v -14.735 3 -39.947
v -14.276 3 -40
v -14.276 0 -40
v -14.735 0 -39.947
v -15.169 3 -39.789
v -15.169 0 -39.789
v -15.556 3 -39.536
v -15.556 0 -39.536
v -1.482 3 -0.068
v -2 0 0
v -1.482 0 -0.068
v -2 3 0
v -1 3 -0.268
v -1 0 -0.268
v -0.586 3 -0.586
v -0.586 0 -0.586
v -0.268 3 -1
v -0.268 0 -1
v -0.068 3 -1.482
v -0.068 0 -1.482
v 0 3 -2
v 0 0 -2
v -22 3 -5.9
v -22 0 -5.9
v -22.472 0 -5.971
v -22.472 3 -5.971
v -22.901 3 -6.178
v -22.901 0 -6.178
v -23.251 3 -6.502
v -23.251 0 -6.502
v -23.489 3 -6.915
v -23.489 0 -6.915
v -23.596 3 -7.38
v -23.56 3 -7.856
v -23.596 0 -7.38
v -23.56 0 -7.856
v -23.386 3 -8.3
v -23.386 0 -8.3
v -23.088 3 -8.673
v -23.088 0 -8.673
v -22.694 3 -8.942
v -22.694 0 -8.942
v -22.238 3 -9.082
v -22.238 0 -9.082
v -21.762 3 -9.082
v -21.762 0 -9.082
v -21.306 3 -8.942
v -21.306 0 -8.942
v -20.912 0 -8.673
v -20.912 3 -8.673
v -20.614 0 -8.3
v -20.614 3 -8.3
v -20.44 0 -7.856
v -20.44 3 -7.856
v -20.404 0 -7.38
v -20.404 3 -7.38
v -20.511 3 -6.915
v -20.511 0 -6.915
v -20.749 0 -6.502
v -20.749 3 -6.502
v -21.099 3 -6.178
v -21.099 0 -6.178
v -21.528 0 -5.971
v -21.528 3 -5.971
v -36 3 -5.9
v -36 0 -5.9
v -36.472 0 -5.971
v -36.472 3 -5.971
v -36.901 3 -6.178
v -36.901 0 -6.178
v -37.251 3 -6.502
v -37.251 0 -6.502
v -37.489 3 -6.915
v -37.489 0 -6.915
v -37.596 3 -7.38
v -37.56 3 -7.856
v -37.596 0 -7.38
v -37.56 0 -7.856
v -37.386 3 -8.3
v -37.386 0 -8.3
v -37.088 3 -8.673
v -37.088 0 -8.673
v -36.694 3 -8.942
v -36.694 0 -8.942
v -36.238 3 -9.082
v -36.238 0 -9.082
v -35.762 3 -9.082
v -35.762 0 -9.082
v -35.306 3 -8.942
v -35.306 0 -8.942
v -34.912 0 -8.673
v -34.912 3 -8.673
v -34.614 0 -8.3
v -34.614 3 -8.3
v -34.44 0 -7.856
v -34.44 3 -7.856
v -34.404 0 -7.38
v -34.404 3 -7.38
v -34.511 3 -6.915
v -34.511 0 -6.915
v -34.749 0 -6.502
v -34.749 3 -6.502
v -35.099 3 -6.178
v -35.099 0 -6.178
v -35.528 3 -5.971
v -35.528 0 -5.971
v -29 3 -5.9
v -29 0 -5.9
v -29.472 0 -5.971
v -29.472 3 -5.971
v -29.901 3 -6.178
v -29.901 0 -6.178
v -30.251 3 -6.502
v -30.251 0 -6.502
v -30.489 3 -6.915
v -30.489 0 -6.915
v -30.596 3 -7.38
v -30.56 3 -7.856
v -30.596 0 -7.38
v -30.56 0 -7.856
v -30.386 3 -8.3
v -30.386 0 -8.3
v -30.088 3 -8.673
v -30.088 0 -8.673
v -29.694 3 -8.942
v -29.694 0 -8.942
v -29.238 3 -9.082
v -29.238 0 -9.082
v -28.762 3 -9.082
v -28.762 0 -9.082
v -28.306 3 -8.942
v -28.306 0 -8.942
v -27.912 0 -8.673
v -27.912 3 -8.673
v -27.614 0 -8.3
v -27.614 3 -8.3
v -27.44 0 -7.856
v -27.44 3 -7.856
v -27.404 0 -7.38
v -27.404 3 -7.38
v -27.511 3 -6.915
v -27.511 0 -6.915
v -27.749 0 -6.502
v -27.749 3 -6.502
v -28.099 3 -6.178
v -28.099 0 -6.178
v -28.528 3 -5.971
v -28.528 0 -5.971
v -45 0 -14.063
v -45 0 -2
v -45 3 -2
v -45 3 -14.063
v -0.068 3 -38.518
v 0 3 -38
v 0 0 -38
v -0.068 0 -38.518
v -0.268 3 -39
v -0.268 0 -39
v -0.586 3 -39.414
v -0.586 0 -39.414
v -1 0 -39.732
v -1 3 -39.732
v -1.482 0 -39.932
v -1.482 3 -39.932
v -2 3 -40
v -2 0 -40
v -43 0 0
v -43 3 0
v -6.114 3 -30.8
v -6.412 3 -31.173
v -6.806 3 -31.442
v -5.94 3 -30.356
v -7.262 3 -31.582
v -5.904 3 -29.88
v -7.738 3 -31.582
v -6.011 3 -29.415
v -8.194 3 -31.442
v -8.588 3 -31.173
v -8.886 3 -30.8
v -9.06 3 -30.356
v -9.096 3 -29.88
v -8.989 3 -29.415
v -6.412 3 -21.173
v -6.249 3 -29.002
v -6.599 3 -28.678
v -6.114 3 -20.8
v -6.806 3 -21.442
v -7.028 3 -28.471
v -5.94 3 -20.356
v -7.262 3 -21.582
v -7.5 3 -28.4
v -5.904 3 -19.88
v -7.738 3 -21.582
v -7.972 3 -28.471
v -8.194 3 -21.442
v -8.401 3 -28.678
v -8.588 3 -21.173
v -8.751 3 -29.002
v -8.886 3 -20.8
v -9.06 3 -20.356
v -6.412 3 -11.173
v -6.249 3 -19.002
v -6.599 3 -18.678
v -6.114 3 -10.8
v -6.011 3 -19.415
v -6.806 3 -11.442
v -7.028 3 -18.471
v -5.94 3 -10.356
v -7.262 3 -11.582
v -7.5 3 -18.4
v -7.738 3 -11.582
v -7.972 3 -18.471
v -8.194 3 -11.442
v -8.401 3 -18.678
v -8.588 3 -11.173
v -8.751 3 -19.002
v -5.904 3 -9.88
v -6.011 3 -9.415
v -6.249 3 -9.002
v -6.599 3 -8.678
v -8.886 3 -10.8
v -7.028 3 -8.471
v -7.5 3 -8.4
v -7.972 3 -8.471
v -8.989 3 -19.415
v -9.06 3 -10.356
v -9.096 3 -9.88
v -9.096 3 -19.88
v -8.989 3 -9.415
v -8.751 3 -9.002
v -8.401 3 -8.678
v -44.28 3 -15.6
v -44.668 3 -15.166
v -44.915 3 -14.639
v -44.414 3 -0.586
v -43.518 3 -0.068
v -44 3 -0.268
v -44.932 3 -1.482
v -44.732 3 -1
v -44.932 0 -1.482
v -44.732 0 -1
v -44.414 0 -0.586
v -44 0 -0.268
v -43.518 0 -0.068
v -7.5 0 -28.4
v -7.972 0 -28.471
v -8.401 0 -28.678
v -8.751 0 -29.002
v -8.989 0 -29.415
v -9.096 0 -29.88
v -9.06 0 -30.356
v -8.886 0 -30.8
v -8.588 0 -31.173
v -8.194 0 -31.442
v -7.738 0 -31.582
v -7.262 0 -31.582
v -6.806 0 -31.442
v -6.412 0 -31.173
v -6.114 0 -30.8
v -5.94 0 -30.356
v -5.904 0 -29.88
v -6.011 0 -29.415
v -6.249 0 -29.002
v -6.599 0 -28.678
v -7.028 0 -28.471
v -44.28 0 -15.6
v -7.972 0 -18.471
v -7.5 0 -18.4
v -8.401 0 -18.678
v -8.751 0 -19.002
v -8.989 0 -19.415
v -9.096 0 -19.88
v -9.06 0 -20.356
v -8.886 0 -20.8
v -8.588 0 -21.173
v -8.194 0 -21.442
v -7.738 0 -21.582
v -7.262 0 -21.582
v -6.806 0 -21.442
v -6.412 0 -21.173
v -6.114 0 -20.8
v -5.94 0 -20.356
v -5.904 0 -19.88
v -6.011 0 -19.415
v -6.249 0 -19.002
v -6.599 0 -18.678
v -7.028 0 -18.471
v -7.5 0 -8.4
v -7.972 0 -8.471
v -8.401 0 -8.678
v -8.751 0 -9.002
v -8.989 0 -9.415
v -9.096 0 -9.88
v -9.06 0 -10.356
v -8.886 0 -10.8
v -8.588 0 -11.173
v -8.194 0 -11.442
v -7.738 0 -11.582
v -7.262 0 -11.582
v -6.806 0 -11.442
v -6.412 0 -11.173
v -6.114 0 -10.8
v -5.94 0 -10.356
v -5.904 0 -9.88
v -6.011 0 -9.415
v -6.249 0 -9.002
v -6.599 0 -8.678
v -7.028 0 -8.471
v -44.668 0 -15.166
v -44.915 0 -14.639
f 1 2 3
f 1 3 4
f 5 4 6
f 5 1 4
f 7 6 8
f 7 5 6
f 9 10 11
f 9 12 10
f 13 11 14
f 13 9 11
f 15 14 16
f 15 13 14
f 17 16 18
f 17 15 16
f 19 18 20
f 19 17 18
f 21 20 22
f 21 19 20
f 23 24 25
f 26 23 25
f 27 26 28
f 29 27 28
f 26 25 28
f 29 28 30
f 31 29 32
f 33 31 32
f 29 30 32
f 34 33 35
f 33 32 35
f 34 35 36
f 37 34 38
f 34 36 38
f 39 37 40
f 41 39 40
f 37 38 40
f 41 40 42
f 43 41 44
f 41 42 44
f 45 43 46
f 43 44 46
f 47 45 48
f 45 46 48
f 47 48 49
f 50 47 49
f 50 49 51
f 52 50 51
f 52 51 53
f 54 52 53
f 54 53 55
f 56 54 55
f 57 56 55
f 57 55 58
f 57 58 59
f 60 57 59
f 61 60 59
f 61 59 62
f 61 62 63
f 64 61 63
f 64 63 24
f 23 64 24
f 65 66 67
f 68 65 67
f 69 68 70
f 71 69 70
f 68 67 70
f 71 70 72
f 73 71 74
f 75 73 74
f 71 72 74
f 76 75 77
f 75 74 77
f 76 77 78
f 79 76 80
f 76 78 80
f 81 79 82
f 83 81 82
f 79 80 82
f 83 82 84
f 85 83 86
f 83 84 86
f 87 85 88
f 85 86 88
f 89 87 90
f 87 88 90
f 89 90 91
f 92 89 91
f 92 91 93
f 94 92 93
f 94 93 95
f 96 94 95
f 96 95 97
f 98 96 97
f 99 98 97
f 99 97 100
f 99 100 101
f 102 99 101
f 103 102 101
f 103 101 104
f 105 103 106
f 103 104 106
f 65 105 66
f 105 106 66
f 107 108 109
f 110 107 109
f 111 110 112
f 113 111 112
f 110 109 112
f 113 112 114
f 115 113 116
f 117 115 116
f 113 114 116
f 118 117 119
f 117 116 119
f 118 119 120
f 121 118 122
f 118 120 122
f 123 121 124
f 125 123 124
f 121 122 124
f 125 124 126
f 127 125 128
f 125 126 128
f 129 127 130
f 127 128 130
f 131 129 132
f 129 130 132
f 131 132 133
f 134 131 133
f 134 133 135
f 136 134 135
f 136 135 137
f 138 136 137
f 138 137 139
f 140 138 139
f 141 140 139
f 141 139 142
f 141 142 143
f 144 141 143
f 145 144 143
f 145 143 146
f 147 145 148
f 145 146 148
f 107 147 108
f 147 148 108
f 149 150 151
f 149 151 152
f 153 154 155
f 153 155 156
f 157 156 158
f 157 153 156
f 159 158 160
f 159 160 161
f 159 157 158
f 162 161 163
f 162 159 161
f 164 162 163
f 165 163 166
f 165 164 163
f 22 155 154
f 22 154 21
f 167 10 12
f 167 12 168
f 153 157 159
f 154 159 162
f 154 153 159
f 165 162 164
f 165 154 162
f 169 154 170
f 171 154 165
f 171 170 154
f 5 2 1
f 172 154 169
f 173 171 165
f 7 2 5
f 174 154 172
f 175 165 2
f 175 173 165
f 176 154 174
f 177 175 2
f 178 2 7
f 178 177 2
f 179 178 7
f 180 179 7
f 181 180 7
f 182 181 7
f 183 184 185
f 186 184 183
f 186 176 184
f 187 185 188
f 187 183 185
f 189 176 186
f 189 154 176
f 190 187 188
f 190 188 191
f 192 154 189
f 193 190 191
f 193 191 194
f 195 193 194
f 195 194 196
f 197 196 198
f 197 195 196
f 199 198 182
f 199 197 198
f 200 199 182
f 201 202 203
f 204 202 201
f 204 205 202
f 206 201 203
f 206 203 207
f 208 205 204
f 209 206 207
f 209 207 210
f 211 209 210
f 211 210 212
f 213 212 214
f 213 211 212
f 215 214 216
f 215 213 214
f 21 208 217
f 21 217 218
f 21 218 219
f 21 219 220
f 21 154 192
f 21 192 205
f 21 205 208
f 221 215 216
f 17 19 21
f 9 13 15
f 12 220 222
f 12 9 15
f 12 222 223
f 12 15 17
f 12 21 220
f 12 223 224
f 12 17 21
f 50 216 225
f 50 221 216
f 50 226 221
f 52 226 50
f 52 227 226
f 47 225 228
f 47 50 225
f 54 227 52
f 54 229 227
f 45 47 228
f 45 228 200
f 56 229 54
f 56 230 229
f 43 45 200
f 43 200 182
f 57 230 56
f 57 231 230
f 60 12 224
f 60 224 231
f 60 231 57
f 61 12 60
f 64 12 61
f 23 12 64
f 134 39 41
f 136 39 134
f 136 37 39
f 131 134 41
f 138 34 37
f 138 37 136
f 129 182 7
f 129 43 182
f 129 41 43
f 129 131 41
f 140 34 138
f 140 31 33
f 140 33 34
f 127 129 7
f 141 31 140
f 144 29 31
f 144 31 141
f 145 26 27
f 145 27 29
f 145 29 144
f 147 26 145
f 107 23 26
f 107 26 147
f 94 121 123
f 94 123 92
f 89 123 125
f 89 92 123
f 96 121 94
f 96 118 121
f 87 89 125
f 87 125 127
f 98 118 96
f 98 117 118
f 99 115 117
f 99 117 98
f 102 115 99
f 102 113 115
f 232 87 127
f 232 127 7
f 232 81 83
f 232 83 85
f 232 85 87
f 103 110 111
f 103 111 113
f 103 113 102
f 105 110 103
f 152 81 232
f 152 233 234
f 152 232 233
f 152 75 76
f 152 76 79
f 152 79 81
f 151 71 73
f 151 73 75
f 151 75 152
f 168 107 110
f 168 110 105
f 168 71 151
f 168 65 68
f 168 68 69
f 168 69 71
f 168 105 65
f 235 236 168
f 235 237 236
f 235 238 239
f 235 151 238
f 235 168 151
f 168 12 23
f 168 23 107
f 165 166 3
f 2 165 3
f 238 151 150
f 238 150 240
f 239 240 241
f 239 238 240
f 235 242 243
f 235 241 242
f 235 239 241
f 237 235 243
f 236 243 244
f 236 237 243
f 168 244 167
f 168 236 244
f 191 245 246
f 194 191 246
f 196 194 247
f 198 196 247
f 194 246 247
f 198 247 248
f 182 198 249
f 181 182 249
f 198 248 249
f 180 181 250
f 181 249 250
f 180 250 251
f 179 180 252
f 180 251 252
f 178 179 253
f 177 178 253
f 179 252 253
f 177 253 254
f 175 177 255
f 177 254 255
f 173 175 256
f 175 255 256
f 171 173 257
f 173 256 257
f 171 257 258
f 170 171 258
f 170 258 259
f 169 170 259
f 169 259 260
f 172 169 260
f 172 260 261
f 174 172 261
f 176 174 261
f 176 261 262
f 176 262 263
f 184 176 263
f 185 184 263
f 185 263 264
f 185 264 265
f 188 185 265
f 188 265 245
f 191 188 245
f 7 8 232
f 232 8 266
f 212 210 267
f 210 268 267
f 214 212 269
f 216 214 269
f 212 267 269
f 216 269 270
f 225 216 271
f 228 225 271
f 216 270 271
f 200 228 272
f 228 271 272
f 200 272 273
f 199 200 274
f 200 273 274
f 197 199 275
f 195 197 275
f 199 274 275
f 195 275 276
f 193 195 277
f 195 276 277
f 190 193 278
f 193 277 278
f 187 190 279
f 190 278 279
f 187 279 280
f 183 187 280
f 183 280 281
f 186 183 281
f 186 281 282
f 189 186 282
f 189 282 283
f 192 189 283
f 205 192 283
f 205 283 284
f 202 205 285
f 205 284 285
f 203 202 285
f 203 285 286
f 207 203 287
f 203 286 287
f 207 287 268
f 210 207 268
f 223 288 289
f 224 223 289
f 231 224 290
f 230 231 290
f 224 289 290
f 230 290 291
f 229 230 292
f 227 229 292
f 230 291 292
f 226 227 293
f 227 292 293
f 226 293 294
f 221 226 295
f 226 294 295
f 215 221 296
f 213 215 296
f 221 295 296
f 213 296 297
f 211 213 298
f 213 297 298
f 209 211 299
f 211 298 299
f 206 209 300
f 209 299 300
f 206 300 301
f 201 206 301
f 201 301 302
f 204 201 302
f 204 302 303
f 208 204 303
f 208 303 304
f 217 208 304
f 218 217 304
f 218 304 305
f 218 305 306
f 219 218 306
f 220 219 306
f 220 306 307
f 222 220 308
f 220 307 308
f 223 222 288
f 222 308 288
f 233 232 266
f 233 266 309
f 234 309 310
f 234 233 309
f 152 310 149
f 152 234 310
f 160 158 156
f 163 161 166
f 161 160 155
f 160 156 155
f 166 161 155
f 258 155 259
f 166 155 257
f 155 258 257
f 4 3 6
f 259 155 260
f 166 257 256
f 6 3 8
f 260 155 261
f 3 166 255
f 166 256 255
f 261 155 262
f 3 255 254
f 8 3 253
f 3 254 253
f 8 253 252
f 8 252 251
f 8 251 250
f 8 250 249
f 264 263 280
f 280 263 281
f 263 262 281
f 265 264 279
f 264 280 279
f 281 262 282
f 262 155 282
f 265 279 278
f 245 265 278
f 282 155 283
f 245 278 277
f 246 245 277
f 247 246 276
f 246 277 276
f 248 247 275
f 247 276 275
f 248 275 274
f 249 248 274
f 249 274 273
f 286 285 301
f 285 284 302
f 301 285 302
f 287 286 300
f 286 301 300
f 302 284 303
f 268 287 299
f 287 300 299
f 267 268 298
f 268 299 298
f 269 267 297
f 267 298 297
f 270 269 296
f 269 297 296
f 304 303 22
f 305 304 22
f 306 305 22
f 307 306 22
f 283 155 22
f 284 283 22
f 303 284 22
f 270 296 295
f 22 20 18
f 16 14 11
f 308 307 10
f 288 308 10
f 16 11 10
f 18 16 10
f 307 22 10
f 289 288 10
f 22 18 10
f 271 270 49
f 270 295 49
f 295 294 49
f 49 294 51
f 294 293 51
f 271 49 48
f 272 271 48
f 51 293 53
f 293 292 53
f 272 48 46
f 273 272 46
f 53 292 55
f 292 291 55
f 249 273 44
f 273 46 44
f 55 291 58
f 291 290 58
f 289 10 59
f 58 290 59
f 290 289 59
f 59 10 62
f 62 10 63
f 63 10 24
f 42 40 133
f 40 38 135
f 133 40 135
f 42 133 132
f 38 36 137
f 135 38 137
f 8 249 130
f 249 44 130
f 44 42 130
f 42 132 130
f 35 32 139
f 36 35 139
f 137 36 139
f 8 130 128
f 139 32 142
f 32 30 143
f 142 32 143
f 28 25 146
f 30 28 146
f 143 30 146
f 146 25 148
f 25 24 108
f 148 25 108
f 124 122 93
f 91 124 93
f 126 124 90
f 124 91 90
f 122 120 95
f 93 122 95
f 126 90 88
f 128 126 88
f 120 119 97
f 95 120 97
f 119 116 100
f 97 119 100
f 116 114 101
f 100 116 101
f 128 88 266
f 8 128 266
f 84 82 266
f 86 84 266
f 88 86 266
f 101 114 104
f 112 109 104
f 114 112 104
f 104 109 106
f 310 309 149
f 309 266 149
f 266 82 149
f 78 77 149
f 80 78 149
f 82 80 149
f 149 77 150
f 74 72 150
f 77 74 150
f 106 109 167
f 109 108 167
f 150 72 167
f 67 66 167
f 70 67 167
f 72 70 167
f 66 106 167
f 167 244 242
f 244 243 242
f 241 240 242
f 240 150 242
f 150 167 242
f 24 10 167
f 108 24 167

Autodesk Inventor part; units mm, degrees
ref_plane "YZ Plane" through (0, 0, 0) normal (1, 0, 0) x (0, 1, 0)
ref_plane "XZ Plane" through (0, 0, 0) normal (0, 1, 0) x (-1, 0, 0)
ref_plane "XY Plane" through (0, 0, 0) normal (0, 0, 1) x (1, 0, 0)
sketch "スケッチ1" plane through (0, 0, 0) normal (0, 1, 0) x (-1, 0, 0)
  line L0 (0, 0) -> (45, 0)
  line L1 (45, 0) -> (45, -15)
  line L2 (0, -40) -> (0, 0)
  line L3 (45, 0) -> (45, -15)
  line L4 (45, 0) -> (60, 0) construction
  line L5 (0, -40) -> (15, -40)
  line L6 (0, -40) -> (15, -40) construction
  line L7 (15, -40) -> (45, -15)
  line L8 (15, -40) -> (0, -40)
  dimension "d2" = 15
  dimension "d3" = 90
  dimension "d4" = 15
  dimension "d5" = 0
extrude "押し出し1" add sketch "スケッチ1" along normal blind 3
sketch "スケッチ2" plane through (0, 3, 0) normal (0, 1, 0) x (1, 0, 0)
  line L0 (-45, 0) -> (0, 0) projected
  line L1 (-45, 15) -> (-45, 0) projected
  line L2 (0, 0) -> (0, 40) projected
  line L3 (0, 40) -> (-15, 40) projected
  point P0 (-36, 7.5)
  point P1 (-7.5, 30)
  point P2 (-29, 7.5)
  point P3 (-22, 7.5)
  point P4 (-7.5, 20)
  point P5 (-7.5, 10)
  dimension "d8" = 7.5
  dimension "d9" = 9
  dimension "d10" = 7
  dimension "d11" = 7
  dimension "d12" = 7.5
  dimension "d13" = 7.5
  dimension "d14" = 7.5
  dimension "d15" = 10
  dimension "d16" = 10
  dimension "d17" = 10
  dimension "d18" = 7.5
  dimension "d19" = 7.5
hole "穴1" at (-36, 3, -7.5) at (-7.5, 3, -30) at (-29, 3, -7.5) at (-22, 3, -7.5) at (-7.5, 3, -20) at (-7.5, 3, -10) direction (0, -1, 0) diameter 3.2 end through all
fillet "フィレット1" radius 2 5 edges at (0, 1.5, -40) (0, 1.5, 0) (-45, 1.5, 0) (-45, 1.5, -15) (-15, 1.5, -40)
properties part number "射出_固定3" material "アルミニウム 6061"
